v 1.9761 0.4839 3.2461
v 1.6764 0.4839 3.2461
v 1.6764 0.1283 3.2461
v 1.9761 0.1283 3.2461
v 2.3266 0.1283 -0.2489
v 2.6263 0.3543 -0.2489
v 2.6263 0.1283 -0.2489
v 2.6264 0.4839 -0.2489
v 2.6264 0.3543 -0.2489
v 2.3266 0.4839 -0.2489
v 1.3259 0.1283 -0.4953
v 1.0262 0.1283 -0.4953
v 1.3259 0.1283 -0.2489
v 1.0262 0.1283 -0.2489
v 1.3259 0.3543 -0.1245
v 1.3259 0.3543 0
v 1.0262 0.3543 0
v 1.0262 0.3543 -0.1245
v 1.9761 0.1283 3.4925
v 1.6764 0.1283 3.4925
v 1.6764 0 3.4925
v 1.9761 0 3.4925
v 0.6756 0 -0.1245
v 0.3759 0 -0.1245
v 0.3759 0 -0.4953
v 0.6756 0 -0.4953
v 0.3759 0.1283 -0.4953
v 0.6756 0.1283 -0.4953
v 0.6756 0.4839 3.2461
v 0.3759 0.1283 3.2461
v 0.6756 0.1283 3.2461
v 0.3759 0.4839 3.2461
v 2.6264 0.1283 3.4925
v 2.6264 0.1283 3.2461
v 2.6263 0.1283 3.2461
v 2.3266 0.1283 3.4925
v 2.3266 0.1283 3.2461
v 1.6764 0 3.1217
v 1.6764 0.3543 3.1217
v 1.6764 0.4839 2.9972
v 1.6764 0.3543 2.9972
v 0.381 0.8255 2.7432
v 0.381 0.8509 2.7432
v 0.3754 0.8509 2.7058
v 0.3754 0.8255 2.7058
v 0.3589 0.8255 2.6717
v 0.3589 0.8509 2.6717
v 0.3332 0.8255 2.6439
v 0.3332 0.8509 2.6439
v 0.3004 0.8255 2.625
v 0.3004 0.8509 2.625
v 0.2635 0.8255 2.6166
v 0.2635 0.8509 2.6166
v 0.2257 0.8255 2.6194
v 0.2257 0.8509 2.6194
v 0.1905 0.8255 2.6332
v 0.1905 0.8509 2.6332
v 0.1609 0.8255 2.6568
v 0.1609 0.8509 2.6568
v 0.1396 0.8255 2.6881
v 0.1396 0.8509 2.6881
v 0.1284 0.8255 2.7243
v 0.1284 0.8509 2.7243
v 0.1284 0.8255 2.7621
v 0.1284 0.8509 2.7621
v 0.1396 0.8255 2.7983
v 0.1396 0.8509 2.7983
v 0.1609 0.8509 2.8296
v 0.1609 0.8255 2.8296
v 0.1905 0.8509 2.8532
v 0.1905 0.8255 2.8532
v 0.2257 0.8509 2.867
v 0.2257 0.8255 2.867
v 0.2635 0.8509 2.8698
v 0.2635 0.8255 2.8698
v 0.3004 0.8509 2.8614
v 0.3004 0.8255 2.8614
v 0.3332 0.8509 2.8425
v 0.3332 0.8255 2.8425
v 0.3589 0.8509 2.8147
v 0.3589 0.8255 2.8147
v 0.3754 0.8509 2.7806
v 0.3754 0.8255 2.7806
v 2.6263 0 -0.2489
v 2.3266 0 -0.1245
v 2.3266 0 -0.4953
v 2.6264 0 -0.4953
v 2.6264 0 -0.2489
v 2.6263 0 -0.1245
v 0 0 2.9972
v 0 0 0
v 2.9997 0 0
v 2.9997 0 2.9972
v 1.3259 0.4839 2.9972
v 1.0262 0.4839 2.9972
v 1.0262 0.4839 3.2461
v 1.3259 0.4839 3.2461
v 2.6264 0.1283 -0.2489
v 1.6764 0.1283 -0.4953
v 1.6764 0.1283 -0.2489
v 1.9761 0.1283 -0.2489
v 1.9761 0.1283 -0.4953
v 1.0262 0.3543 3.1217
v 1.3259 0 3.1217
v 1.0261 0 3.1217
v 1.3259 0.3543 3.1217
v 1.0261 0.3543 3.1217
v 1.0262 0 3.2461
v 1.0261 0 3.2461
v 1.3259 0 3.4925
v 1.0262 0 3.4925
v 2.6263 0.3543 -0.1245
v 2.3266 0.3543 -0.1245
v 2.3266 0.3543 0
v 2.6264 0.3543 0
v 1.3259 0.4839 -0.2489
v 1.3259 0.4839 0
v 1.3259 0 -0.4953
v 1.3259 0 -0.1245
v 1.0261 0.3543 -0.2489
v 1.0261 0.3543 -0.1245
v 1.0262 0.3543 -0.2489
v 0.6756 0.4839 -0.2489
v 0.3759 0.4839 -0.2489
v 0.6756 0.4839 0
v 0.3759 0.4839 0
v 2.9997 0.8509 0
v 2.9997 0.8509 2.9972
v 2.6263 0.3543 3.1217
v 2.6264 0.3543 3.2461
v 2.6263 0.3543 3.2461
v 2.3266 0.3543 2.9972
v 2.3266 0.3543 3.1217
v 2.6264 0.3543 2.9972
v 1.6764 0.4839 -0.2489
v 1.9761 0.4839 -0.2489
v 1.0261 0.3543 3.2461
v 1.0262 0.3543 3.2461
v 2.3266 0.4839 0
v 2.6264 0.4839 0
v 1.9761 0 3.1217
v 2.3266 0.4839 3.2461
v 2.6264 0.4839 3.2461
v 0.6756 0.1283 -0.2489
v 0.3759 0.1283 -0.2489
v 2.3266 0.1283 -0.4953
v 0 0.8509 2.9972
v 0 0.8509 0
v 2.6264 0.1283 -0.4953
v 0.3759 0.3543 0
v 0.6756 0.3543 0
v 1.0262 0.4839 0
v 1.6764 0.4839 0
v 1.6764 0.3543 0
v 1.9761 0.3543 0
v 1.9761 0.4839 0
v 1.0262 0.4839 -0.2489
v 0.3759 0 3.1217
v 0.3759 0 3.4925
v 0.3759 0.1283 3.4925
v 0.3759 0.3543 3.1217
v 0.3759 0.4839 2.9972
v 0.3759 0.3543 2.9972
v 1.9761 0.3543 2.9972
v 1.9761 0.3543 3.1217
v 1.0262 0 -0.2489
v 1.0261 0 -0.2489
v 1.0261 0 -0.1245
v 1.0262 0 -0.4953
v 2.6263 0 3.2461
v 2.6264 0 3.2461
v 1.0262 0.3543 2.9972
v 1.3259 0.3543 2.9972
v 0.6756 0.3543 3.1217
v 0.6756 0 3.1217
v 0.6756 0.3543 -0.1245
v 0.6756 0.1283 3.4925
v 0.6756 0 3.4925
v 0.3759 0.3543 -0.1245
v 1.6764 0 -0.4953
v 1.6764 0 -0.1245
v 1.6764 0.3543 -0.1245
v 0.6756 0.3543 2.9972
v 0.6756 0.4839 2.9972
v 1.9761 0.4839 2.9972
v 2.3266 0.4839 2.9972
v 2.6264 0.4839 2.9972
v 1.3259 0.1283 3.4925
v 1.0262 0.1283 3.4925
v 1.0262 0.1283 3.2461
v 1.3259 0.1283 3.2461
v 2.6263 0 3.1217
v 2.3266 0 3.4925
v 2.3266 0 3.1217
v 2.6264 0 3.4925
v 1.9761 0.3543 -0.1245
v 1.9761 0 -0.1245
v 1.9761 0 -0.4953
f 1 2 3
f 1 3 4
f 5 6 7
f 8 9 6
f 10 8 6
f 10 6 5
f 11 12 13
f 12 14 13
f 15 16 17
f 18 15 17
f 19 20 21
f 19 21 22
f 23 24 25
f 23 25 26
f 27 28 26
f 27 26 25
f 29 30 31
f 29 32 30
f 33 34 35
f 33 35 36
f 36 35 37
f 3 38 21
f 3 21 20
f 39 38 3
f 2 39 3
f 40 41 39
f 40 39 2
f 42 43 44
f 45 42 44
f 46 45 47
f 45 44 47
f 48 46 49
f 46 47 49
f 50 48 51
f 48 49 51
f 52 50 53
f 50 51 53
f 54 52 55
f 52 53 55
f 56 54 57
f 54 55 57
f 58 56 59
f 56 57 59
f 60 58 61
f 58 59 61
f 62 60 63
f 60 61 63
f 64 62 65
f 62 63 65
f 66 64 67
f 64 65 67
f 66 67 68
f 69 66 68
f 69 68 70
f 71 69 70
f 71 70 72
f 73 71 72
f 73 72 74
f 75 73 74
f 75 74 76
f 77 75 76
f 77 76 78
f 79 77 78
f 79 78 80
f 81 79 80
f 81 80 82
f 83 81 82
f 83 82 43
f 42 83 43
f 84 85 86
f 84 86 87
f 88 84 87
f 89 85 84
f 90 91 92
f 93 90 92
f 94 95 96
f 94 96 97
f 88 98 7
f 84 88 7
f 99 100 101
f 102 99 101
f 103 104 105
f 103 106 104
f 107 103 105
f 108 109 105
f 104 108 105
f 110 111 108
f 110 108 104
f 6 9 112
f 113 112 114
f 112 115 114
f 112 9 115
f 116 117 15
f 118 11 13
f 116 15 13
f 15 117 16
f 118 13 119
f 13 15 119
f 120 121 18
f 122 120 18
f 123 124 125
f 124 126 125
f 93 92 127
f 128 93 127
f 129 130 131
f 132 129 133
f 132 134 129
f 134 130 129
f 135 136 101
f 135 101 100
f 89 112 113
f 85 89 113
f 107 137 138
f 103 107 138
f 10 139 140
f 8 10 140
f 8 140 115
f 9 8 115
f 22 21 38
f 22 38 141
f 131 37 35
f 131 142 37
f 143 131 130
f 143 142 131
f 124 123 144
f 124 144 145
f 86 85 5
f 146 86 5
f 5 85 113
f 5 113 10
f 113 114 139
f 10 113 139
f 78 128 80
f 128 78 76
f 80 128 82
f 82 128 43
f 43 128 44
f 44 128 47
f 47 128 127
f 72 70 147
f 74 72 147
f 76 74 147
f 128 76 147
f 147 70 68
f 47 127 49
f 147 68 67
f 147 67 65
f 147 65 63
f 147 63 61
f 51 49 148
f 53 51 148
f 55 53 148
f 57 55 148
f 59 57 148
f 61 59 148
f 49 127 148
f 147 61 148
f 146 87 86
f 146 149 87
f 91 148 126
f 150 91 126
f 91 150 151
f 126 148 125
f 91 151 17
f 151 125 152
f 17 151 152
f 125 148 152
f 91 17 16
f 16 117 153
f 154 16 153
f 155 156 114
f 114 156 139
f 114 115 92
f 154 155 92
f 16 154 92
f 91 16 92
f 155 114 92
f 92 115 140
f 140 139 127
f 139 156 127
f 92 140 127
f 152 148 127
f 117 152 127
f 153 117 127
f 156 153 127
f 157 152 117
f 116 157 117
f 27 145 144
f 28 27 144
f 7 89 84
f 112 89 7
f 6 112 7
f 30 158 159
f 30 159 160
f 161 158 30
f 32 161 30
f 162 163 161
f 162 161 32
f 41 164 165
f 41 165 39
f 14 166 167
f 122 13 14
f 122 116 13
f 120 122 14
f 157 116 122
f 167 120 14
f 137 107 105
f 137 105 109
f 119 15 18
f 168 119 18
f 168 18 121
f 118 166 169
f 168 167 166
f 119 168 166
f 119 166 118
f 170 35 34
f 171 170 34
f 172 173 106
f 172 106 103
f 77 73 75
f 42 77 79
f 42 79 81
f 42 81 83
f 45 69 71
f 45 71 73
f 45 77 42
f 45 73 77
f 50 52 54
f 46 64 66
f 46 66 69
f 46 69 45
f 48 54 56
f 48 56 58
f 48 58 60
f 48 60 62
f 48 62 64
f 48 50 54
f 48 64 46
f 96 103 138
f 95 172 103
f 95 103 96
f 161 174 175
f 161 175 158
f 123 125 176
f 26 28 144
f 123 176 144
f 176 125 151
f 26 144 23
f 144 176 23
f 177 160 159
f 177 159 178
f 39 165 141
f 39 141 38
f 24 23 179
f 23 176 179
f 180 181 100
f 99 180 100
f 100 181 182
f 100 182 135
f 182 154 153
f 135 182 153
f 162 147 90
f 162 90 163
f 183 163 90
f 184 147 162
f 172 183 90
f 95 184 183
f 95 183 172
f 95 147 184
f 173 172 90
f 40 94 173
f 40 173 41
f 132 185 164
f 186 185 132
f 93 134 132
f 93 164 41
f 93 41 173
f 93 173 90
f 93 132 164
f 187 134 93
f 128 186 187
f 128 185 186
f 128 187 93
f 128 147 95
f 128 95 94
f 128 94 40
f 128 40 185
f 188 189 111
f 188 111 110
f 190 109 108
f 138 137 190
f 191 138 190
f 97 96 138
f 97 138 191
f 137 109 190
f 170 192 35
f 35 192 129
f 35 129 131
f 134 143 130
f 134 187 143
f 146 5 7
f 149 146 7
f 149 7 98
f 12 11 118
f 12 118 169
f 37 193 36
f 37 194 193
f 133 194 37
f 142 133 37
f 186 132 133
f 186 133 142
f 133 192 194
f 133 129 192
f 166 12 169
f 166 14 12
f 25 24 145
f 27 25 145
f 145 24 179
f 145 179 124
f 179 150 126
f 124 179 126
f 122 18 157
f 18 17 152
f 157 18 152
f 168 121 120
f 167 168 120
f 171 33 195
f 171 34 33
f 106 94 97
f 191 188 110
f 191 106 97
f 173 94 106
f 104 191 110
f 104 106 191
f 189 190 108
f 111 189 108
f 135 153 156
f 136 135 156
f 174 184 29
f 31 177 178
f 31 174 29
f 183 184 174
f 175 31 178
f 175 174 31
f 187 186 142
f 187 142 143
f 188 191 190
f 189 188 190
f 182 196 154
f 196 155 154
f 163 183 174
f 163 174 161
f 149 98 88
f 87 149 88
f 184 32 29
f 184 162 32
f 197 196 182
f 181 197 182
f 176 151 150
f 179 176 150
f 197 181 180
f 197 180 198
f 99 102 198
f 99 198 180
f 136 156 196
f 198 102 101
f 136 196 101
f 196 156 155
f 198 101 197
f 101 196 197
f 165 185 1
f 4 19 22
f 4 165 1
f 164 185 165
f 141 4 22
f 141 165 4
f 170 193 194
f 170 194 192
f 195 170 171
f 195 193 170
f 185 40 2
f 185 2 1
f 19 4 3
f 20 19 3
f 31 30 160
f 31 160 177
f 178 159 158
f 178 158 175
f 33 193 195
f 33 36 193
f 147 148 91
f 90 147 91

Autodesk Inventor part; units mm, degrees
ref_plane "YZ Plane" through (0, 0, 0) normal (1, 0, 0) x (0, 1, 0)
ref_plane "XZ Plane" through (0, 0, 0) normal (0, 1, 0) x (-1, 0, 0)
ref_plane "XY Plane" through (0, 0, 0) normal (0, 0, 1) x (1, 0, 0)
sketch "Sketch1" plane through (0, 0, 0) normal (0, 0, 1) x (1, 0, 0)
  line L0 (0, 0) -> (2.9997, 0)
  line L1 (2.9997, 0) -> (2.9997, 0.8509)
  line L2 (2.9997, 0.8509) -> (0, 0.8509)
  line L3 (0, 0.8509) -> (0, 0)
  dimension "d0" = 2.9997
  dimension "d1" = 0.8509
extrude "Extrusion1" add sketch "Sketch1" along normal blind 2.9972
sketch "Sketch2" plane through (0, 0, 2.9972) normal (0, 0, 1) x (1, 0, 0)
  line L0 (0.3759, 0.4839) -> (0.6756, 0.4839)
  line L1 (0.6756, 0.4839) -> (0.6756, 0.3543)
  line L2 (0.6756, 0.3543) -> (0.3759, 0.3543)
  line L3 (0.3759, 0.3543) -> (0.3759, 0.4839)
  line L4 (0, 0.8509) -> (0, 0) projected
  line L5 (2.9997, 0.8509) -> (0, 0.8509) projected
  line L6 (1.0262, 0.4839) -> (1.3259, 0.4839)
  line L7 (1.3259, 0.4839) -> (1.3259, 0.3543)
  line L8 (1.3259, 0.3543) -> (1.0262, 0.3543)
  line L9 (1.0262, 0.3543) -> (1.0262, 0.4839)
  line L10 (1.6764, 0.4839) -> (1.9761, 0.4839)
  line L11 (1.9761, 0.4839) -> (1.9761, 0.3543)
  line L12 (1.9761, 0.3543) -> (1.6764, 0.3543)
  line L13 (1.6764, 0.3543) -> (1.6764, 0.4839)
  line L14 (2.3266, 0.4839) -> (2.6264, 0.4839)
  line L15 (2.6264, 0.4839) -> (2.6264, 0.3543)
  line L16 (2.6264, 0.3543) -> (2.3266, 0.3543)
  line L17 (2.3266, 0.3543) -> (2.3266, 0.4839)
  dimension "d4" = 0.1295
  dimension "d5" = 0.2997
  dimension "d6" = 0.3759
  dimension "d7" = 0.367
  dimension "d10" = 0.6502
extrude "Extrusion2" add sketch "Sketch2" along normal blind 0.1194
extrude "Extrusion3" add sketch "Sketch2" against normal blind 3.1166
sketch "Sketch3" plane through (0, 0, 3.1166) normal (0, 0, 1) x (1, 0, 0)
  line L0 (0.6756, 0.4839) -> (0.3759, 0.4839)
  line L1 (0.3759, 0.4839) -> (0.3759, 0.3543)
  line L2 (0.3759, 0.3543) -> (0.6756, 0.3543)
  line L3 (0.6756, 0.3543) -> (0.6756, 0.4839)
  line L4 (1.3259, 0.4839) -> (1.0262, 0.4839)
  line L5 (1.0262, 0.4839) -> (1.0262, 0.3543)
  line L6 (1.0262, 0.3543) -> (1.3259, 0.3543)
  line L7 (1.3259, 0.3543) -> (1.3259, 0.4839)
  line L8 (1.9761, 0.4839) -> (1.6764, 0.4839)
  line L9 (1.6764, 0.4839) -> (1.6764, 0.3543)
  line L10 (1.6764, 0.3543) -> (1.9761, 0.3543)
  line L11 (1.9761, 0.3543) -> (1.9761, 0.4839)
  line L12 (2.6264, 0.4839) -> (2.3266, 0.4839)
  line L13 (2.3266, 0.4839) -> (2.3266, 0.3543)
  line L14 (2.3266, 0.3543) -> (2.6264, 0.3543)
  line L15 (2.6264, 0.3543) -> (2.6264, 0.4839)
  point P0 (0, 0)
extrude "Extrusion4" add sketch "Sketch3" along normal blind 0.1295
sketch "Sketch4" plane through (0, 0, -0.1194) normal (0, 0, -1) x (-1, 0, 0)
  line L0 (-2.6264, 0.4839) -> (-2.3266, 0.4839)
  line L1 (-2.3266, 0.4839) -> (-2.3266, 0.3543)
  line L2 (-2.3266, 0.3543) -> (-2.6264, 0.3543)
  line L3 (-2.6264, 0.3543) -> (-2.6264, 0.4839)
  line L4 (-1.9761, 0.4839) -> (-1.6764, 0.4839)
  line L5 (-1.6764, 0.4839) -> (-1.6764, 0.3543)
  line L6 (-1.6764, 0.3543) -> (-1.9761, 0.3543)
  line L7 (-1.9761, 0.3543) -> (-1.9761, 0.4839)
  line L8 (-1.3259, 0.4839) -> (-1.0262, 0.4839)
  line L9 (-1.0262, 0.4839) -> (-1.0262, 0.3543)
  line L10 (-1.0262, 0.3543) -> (-1.3259, 0.3543)
  line L11 (-1.3259, 0.3543) -> (-1.3259, 0.4839)
  line L12 (-0.6756, 0.4839) -> (-0.3759, 0.4839)
  line L13 (-0.3759, 0.4839) -> (-0.3759, 0.3543)
  line L14 (-0.3759, 0.3543) -> (-0.6756, 0.3543)
  line L15 (-0.6756, 0.3543) -> (-0.6756, 0.4839)
  point P0 (0, 0)
extrude "Extrusion5" add sketch "Sketch4" along normal blind 0.1295
sketch "Sketch5" plane through (0.3759, 0.3543, 0) normal (0, -1, 0) x (1, 0, 0)
  line L0 (0.2997, 0) -> (0.2997, -0.2489) projected
  line L1 (0, -0.2489) -> (0.2997, -0.2489)
  line L2 (0.2997, -0.2489) -> (0.2997, -0.1245)
  line L3 (0.2997, -0.1245) -> (0, -0.1245)
  line L4 (0, -0.1245) -> (0, -0.2489)
  line L5 (0.95, 0) -> (0.95, -0.2489) projected
  line L6 (0.6502, -0.2489) -> (0.95, -0.2489)
  line L7 (0.95, -0.2489) -> (0.95, -0.1245)
  line L8 (0.95, -0.1245) -> (0.6502, -0.1245)
  line L9 (0.6502, -0.1245) -> (0.6502, -0.2489)
  line L10 (1.3005, -0.2489) -> (1.6002, -0.2489)
  line L11 (1.6002, -0.2489) -> (1.6002, -0.1245)
  line L12 (1.6002, -0.1245) -> (1.3005, -0.1245)
  line L13 (1.3005, -0.1245) -> (1.3005, -0.2489)
  line L14 (2.2504, 0) -> (2.2504, -0.2489) projected
  line L15 (1.9507, -0.2489) -> (2.2504, -0.2489)
  line L16 (2.2504, -0.2489) -> (2.2504, -0.1245)
  line L17 (2.2504, -0.1245) -> (1.9507, -0.1245)
  line L18 (1.9507, -0.1245) -> (1.9507, -0.2489)
  line L19 (0.2997, 2.9972) -> (0.2997, 3.2461) projected
  line L20 (0, 3.2461) -> (0.2997, 3.2461)
  line L21 (0.2997, 3.2461) -> (0.2997, 3.1217)
  line L22 (0.2997, 3.1217) -> (0, 3.1217)
  line L23 (0, 3.1217) -> (0, 3.2461)
  line L24 (0.95, 2.9972) -> (0.95, 3.2461) projected
  line L25 (0.6502, 3.2461) -> (0.95, 3.2461)
  line L26 (0.95, 3.2461) -> (0.95, 3.1217)
  line L27 (0.95, 3.1217) -> (0.6502, 3.1217)
  line L28 (0.6502, 3.1217) -> (0.6502, 3.2461)
  line L29 (1.6002, 2.9972) -> (1.6002, 3.2461) projected
  line L30 (1.3005, 3.2461) -> (1.6002, 3.2461)
  line L31 (1.6002, 3.2461) -> (1.6002, 3.1217)
  line L32 (1.6002, 3.1217) -> (1.3005, 3.1217)
  line L33 (1.3005, 3.1217) -> (1.3005, 3.2461)
  line L34 (2.2504, 2.9972) -> (2.2504, 3.2461) projected
  line L35 (1.9507, 3.2461) -> (2.2504, 3.2461)
  line L36 (2.2504, 3.2461) -> (2.2504, 3.1217)
  line L37 (2.2504, 3.1217) -> (1.9507, 3.1217)
  line L38 (1.9507, 3.1217) -> (1.9507, 3.2461)
  point P0 (-0.3759, 0)
extrude "Extrusion6" add sketch "Sketch5" along normal blind 0.3556
sketch "Sketch6" plane through (0, 0, 3.2461) normal (0, 0, 1) x (1, 0, 0)
  line L0 (0.3759, 0.4839) -> (0.3759, -0.0013) projected
  line L1 (0.6756, -0.0013) -> (0.3759, -0.0013)
  line L2 (0.3759, -0.0013) -> (0.3759, 0.1283)
  line L3 (0.3759, 0.1283) -> (0.6756, 0.1283)
  line L4 (0.6756, 0.1283) -> (0.6756, -0.0013)
  line L5 (1.3259, 0.3543) -> (1.3259, -0.0013) projected
  line L6 (1.0262, -0.0013) -> (1.3259, -0.0013)
  line L7 (1.3259, -0.0013) -> (1.3259, 0.1283)
  line L8 (1.3259, 0.1283) -> (1.0262, 0.1283)
  line L9 (1.0262, 0.1283) -> (1.0262, -0.0013)
  line L10 (1.9761, 0.3543) -> (1.9761, -0.0013) projected
  line L11 (1.6764, -0.0013) -> (1.9761, -0.0013)
  line L12 (1.9761, -0.0013) -> (1.9761, 0.1283)
  line L13 (1.9761, 0.1283) -> (1.6764, 0.1283)
  line L14 (1.6764, 0.1283) -> (1.6764, -0.0013)
  line L15 (2.6264, 0.4839) -> (2.6264, -0.0013) projected
  line L16 (2.3266, -0.0013) -> (2.6264, -0.0013)
  line L17 (2.6264, -0.0013) -> (2.6264, 0.1283)
  line L18 (2.6264, 0.1283) -> (2.3266, 0.1283)
  line L19 (2.3266, 0.1283) -> (2.3266, -0.0013)
  point P0 (0, 0)
  dimension "d25" = 0.1295
extrude "Extrusion7" add sketch "Sketch6" along normal blind 0.2464
sketch "Sketch7" plane through (0, 0, -0.2489) normal (0, 0, -1) x (-1, 0, 0)
  line L0 (-2.6264, -0.0013) -> (-2.3266, -0.0013)
  line L1 (-2.3266, -0.0013) -> (-2.3266, 0.1283)
  line L2 (-2.3266, 0.1283) -> (-2.6264, 0.1283)
  line L3 (-2.6264, 0.1283) -> (-2.6264, -0.0013)
  line L4 (-1.9761, -0.0013) -> (-1.6764, -0.0013)
  line L5 (-1.6764, -0.0013) -> (-1.6764, 0.1283)
  line L6 (-1.6764, 0.1283) -> (-1.9761, 0.1283)
  line L7 (-1.9761, 0.1283) -> (-1.9761, -0.0013)
  line L8 (-1.0262, 0.3543) -> (-1.0262, -0.0013) projected
  line L9 (-1.3259, -0.0013) -> (-1.0262, -0.0013)
  line L10 (-1.0262, -0.0013) -> (-1.0262, 0.1283)
  line L11 (-1.0262, 0.1283) -> (-1.3259, 0.1283)
  line L12 (-1.3259, 0.1283) -> (-1.3259, -0.0013)
  line L13 (-0.6756, -0.0013) -> (-0.3759, -0.0013)
  line L14 (-0.3759, -0.0013) -> (-0.3759, 0.1283)
  line L15 (-0.3759, 0.1283) -> (-0.6756, 0.1283)
  line L16 (-0.6756, 0.1283) -> (-0.6756, -0.0013)
  point P0 (0, 0)
extrude "Extrusion8" add sketch "Sketch7" along normal blind 0.2464
sketch "Sketch8" plane through (0, 0, 0) normal (0, -1, 0) x (1, 0, 0)
  line L0 (-1.2528, -0.9199) -> (4.4304, -0.9199)
  line L1 (4.4304, -0.9199) -> (4.4304, 4.3493)
  line L2 (4.4304, 4.3493) -> (-1.2528, 4.3493)
  line L3 (-1.2528, 4.3493) -> (-1.2528, -0.9199)
  point P0 (0, 0)
extrude "Extrusion9" cut sketch "Sketch8" along normal blind 0.2464
sketch "Sketch9" plane through (0, 0.8509, 0) normal (0, 1, 0) x (1, 0, 0)
  circle A0 centre (0.254, -2.7432) radius 0.127
  line L0 (2.9997, -2.9972) -> (0, -2.9972) projected
  line L1 (0, 0) -> (0, -2.9972) projected
  dimension "d32" = 0.254
  dimension "d33" = 0.254
  dimension "d34" = 0.254
extrude "Extrusion10" cut sketch "Sketch9" against normal blind 0.0254
properties part number "s74LVC2G08 Dual AND"
